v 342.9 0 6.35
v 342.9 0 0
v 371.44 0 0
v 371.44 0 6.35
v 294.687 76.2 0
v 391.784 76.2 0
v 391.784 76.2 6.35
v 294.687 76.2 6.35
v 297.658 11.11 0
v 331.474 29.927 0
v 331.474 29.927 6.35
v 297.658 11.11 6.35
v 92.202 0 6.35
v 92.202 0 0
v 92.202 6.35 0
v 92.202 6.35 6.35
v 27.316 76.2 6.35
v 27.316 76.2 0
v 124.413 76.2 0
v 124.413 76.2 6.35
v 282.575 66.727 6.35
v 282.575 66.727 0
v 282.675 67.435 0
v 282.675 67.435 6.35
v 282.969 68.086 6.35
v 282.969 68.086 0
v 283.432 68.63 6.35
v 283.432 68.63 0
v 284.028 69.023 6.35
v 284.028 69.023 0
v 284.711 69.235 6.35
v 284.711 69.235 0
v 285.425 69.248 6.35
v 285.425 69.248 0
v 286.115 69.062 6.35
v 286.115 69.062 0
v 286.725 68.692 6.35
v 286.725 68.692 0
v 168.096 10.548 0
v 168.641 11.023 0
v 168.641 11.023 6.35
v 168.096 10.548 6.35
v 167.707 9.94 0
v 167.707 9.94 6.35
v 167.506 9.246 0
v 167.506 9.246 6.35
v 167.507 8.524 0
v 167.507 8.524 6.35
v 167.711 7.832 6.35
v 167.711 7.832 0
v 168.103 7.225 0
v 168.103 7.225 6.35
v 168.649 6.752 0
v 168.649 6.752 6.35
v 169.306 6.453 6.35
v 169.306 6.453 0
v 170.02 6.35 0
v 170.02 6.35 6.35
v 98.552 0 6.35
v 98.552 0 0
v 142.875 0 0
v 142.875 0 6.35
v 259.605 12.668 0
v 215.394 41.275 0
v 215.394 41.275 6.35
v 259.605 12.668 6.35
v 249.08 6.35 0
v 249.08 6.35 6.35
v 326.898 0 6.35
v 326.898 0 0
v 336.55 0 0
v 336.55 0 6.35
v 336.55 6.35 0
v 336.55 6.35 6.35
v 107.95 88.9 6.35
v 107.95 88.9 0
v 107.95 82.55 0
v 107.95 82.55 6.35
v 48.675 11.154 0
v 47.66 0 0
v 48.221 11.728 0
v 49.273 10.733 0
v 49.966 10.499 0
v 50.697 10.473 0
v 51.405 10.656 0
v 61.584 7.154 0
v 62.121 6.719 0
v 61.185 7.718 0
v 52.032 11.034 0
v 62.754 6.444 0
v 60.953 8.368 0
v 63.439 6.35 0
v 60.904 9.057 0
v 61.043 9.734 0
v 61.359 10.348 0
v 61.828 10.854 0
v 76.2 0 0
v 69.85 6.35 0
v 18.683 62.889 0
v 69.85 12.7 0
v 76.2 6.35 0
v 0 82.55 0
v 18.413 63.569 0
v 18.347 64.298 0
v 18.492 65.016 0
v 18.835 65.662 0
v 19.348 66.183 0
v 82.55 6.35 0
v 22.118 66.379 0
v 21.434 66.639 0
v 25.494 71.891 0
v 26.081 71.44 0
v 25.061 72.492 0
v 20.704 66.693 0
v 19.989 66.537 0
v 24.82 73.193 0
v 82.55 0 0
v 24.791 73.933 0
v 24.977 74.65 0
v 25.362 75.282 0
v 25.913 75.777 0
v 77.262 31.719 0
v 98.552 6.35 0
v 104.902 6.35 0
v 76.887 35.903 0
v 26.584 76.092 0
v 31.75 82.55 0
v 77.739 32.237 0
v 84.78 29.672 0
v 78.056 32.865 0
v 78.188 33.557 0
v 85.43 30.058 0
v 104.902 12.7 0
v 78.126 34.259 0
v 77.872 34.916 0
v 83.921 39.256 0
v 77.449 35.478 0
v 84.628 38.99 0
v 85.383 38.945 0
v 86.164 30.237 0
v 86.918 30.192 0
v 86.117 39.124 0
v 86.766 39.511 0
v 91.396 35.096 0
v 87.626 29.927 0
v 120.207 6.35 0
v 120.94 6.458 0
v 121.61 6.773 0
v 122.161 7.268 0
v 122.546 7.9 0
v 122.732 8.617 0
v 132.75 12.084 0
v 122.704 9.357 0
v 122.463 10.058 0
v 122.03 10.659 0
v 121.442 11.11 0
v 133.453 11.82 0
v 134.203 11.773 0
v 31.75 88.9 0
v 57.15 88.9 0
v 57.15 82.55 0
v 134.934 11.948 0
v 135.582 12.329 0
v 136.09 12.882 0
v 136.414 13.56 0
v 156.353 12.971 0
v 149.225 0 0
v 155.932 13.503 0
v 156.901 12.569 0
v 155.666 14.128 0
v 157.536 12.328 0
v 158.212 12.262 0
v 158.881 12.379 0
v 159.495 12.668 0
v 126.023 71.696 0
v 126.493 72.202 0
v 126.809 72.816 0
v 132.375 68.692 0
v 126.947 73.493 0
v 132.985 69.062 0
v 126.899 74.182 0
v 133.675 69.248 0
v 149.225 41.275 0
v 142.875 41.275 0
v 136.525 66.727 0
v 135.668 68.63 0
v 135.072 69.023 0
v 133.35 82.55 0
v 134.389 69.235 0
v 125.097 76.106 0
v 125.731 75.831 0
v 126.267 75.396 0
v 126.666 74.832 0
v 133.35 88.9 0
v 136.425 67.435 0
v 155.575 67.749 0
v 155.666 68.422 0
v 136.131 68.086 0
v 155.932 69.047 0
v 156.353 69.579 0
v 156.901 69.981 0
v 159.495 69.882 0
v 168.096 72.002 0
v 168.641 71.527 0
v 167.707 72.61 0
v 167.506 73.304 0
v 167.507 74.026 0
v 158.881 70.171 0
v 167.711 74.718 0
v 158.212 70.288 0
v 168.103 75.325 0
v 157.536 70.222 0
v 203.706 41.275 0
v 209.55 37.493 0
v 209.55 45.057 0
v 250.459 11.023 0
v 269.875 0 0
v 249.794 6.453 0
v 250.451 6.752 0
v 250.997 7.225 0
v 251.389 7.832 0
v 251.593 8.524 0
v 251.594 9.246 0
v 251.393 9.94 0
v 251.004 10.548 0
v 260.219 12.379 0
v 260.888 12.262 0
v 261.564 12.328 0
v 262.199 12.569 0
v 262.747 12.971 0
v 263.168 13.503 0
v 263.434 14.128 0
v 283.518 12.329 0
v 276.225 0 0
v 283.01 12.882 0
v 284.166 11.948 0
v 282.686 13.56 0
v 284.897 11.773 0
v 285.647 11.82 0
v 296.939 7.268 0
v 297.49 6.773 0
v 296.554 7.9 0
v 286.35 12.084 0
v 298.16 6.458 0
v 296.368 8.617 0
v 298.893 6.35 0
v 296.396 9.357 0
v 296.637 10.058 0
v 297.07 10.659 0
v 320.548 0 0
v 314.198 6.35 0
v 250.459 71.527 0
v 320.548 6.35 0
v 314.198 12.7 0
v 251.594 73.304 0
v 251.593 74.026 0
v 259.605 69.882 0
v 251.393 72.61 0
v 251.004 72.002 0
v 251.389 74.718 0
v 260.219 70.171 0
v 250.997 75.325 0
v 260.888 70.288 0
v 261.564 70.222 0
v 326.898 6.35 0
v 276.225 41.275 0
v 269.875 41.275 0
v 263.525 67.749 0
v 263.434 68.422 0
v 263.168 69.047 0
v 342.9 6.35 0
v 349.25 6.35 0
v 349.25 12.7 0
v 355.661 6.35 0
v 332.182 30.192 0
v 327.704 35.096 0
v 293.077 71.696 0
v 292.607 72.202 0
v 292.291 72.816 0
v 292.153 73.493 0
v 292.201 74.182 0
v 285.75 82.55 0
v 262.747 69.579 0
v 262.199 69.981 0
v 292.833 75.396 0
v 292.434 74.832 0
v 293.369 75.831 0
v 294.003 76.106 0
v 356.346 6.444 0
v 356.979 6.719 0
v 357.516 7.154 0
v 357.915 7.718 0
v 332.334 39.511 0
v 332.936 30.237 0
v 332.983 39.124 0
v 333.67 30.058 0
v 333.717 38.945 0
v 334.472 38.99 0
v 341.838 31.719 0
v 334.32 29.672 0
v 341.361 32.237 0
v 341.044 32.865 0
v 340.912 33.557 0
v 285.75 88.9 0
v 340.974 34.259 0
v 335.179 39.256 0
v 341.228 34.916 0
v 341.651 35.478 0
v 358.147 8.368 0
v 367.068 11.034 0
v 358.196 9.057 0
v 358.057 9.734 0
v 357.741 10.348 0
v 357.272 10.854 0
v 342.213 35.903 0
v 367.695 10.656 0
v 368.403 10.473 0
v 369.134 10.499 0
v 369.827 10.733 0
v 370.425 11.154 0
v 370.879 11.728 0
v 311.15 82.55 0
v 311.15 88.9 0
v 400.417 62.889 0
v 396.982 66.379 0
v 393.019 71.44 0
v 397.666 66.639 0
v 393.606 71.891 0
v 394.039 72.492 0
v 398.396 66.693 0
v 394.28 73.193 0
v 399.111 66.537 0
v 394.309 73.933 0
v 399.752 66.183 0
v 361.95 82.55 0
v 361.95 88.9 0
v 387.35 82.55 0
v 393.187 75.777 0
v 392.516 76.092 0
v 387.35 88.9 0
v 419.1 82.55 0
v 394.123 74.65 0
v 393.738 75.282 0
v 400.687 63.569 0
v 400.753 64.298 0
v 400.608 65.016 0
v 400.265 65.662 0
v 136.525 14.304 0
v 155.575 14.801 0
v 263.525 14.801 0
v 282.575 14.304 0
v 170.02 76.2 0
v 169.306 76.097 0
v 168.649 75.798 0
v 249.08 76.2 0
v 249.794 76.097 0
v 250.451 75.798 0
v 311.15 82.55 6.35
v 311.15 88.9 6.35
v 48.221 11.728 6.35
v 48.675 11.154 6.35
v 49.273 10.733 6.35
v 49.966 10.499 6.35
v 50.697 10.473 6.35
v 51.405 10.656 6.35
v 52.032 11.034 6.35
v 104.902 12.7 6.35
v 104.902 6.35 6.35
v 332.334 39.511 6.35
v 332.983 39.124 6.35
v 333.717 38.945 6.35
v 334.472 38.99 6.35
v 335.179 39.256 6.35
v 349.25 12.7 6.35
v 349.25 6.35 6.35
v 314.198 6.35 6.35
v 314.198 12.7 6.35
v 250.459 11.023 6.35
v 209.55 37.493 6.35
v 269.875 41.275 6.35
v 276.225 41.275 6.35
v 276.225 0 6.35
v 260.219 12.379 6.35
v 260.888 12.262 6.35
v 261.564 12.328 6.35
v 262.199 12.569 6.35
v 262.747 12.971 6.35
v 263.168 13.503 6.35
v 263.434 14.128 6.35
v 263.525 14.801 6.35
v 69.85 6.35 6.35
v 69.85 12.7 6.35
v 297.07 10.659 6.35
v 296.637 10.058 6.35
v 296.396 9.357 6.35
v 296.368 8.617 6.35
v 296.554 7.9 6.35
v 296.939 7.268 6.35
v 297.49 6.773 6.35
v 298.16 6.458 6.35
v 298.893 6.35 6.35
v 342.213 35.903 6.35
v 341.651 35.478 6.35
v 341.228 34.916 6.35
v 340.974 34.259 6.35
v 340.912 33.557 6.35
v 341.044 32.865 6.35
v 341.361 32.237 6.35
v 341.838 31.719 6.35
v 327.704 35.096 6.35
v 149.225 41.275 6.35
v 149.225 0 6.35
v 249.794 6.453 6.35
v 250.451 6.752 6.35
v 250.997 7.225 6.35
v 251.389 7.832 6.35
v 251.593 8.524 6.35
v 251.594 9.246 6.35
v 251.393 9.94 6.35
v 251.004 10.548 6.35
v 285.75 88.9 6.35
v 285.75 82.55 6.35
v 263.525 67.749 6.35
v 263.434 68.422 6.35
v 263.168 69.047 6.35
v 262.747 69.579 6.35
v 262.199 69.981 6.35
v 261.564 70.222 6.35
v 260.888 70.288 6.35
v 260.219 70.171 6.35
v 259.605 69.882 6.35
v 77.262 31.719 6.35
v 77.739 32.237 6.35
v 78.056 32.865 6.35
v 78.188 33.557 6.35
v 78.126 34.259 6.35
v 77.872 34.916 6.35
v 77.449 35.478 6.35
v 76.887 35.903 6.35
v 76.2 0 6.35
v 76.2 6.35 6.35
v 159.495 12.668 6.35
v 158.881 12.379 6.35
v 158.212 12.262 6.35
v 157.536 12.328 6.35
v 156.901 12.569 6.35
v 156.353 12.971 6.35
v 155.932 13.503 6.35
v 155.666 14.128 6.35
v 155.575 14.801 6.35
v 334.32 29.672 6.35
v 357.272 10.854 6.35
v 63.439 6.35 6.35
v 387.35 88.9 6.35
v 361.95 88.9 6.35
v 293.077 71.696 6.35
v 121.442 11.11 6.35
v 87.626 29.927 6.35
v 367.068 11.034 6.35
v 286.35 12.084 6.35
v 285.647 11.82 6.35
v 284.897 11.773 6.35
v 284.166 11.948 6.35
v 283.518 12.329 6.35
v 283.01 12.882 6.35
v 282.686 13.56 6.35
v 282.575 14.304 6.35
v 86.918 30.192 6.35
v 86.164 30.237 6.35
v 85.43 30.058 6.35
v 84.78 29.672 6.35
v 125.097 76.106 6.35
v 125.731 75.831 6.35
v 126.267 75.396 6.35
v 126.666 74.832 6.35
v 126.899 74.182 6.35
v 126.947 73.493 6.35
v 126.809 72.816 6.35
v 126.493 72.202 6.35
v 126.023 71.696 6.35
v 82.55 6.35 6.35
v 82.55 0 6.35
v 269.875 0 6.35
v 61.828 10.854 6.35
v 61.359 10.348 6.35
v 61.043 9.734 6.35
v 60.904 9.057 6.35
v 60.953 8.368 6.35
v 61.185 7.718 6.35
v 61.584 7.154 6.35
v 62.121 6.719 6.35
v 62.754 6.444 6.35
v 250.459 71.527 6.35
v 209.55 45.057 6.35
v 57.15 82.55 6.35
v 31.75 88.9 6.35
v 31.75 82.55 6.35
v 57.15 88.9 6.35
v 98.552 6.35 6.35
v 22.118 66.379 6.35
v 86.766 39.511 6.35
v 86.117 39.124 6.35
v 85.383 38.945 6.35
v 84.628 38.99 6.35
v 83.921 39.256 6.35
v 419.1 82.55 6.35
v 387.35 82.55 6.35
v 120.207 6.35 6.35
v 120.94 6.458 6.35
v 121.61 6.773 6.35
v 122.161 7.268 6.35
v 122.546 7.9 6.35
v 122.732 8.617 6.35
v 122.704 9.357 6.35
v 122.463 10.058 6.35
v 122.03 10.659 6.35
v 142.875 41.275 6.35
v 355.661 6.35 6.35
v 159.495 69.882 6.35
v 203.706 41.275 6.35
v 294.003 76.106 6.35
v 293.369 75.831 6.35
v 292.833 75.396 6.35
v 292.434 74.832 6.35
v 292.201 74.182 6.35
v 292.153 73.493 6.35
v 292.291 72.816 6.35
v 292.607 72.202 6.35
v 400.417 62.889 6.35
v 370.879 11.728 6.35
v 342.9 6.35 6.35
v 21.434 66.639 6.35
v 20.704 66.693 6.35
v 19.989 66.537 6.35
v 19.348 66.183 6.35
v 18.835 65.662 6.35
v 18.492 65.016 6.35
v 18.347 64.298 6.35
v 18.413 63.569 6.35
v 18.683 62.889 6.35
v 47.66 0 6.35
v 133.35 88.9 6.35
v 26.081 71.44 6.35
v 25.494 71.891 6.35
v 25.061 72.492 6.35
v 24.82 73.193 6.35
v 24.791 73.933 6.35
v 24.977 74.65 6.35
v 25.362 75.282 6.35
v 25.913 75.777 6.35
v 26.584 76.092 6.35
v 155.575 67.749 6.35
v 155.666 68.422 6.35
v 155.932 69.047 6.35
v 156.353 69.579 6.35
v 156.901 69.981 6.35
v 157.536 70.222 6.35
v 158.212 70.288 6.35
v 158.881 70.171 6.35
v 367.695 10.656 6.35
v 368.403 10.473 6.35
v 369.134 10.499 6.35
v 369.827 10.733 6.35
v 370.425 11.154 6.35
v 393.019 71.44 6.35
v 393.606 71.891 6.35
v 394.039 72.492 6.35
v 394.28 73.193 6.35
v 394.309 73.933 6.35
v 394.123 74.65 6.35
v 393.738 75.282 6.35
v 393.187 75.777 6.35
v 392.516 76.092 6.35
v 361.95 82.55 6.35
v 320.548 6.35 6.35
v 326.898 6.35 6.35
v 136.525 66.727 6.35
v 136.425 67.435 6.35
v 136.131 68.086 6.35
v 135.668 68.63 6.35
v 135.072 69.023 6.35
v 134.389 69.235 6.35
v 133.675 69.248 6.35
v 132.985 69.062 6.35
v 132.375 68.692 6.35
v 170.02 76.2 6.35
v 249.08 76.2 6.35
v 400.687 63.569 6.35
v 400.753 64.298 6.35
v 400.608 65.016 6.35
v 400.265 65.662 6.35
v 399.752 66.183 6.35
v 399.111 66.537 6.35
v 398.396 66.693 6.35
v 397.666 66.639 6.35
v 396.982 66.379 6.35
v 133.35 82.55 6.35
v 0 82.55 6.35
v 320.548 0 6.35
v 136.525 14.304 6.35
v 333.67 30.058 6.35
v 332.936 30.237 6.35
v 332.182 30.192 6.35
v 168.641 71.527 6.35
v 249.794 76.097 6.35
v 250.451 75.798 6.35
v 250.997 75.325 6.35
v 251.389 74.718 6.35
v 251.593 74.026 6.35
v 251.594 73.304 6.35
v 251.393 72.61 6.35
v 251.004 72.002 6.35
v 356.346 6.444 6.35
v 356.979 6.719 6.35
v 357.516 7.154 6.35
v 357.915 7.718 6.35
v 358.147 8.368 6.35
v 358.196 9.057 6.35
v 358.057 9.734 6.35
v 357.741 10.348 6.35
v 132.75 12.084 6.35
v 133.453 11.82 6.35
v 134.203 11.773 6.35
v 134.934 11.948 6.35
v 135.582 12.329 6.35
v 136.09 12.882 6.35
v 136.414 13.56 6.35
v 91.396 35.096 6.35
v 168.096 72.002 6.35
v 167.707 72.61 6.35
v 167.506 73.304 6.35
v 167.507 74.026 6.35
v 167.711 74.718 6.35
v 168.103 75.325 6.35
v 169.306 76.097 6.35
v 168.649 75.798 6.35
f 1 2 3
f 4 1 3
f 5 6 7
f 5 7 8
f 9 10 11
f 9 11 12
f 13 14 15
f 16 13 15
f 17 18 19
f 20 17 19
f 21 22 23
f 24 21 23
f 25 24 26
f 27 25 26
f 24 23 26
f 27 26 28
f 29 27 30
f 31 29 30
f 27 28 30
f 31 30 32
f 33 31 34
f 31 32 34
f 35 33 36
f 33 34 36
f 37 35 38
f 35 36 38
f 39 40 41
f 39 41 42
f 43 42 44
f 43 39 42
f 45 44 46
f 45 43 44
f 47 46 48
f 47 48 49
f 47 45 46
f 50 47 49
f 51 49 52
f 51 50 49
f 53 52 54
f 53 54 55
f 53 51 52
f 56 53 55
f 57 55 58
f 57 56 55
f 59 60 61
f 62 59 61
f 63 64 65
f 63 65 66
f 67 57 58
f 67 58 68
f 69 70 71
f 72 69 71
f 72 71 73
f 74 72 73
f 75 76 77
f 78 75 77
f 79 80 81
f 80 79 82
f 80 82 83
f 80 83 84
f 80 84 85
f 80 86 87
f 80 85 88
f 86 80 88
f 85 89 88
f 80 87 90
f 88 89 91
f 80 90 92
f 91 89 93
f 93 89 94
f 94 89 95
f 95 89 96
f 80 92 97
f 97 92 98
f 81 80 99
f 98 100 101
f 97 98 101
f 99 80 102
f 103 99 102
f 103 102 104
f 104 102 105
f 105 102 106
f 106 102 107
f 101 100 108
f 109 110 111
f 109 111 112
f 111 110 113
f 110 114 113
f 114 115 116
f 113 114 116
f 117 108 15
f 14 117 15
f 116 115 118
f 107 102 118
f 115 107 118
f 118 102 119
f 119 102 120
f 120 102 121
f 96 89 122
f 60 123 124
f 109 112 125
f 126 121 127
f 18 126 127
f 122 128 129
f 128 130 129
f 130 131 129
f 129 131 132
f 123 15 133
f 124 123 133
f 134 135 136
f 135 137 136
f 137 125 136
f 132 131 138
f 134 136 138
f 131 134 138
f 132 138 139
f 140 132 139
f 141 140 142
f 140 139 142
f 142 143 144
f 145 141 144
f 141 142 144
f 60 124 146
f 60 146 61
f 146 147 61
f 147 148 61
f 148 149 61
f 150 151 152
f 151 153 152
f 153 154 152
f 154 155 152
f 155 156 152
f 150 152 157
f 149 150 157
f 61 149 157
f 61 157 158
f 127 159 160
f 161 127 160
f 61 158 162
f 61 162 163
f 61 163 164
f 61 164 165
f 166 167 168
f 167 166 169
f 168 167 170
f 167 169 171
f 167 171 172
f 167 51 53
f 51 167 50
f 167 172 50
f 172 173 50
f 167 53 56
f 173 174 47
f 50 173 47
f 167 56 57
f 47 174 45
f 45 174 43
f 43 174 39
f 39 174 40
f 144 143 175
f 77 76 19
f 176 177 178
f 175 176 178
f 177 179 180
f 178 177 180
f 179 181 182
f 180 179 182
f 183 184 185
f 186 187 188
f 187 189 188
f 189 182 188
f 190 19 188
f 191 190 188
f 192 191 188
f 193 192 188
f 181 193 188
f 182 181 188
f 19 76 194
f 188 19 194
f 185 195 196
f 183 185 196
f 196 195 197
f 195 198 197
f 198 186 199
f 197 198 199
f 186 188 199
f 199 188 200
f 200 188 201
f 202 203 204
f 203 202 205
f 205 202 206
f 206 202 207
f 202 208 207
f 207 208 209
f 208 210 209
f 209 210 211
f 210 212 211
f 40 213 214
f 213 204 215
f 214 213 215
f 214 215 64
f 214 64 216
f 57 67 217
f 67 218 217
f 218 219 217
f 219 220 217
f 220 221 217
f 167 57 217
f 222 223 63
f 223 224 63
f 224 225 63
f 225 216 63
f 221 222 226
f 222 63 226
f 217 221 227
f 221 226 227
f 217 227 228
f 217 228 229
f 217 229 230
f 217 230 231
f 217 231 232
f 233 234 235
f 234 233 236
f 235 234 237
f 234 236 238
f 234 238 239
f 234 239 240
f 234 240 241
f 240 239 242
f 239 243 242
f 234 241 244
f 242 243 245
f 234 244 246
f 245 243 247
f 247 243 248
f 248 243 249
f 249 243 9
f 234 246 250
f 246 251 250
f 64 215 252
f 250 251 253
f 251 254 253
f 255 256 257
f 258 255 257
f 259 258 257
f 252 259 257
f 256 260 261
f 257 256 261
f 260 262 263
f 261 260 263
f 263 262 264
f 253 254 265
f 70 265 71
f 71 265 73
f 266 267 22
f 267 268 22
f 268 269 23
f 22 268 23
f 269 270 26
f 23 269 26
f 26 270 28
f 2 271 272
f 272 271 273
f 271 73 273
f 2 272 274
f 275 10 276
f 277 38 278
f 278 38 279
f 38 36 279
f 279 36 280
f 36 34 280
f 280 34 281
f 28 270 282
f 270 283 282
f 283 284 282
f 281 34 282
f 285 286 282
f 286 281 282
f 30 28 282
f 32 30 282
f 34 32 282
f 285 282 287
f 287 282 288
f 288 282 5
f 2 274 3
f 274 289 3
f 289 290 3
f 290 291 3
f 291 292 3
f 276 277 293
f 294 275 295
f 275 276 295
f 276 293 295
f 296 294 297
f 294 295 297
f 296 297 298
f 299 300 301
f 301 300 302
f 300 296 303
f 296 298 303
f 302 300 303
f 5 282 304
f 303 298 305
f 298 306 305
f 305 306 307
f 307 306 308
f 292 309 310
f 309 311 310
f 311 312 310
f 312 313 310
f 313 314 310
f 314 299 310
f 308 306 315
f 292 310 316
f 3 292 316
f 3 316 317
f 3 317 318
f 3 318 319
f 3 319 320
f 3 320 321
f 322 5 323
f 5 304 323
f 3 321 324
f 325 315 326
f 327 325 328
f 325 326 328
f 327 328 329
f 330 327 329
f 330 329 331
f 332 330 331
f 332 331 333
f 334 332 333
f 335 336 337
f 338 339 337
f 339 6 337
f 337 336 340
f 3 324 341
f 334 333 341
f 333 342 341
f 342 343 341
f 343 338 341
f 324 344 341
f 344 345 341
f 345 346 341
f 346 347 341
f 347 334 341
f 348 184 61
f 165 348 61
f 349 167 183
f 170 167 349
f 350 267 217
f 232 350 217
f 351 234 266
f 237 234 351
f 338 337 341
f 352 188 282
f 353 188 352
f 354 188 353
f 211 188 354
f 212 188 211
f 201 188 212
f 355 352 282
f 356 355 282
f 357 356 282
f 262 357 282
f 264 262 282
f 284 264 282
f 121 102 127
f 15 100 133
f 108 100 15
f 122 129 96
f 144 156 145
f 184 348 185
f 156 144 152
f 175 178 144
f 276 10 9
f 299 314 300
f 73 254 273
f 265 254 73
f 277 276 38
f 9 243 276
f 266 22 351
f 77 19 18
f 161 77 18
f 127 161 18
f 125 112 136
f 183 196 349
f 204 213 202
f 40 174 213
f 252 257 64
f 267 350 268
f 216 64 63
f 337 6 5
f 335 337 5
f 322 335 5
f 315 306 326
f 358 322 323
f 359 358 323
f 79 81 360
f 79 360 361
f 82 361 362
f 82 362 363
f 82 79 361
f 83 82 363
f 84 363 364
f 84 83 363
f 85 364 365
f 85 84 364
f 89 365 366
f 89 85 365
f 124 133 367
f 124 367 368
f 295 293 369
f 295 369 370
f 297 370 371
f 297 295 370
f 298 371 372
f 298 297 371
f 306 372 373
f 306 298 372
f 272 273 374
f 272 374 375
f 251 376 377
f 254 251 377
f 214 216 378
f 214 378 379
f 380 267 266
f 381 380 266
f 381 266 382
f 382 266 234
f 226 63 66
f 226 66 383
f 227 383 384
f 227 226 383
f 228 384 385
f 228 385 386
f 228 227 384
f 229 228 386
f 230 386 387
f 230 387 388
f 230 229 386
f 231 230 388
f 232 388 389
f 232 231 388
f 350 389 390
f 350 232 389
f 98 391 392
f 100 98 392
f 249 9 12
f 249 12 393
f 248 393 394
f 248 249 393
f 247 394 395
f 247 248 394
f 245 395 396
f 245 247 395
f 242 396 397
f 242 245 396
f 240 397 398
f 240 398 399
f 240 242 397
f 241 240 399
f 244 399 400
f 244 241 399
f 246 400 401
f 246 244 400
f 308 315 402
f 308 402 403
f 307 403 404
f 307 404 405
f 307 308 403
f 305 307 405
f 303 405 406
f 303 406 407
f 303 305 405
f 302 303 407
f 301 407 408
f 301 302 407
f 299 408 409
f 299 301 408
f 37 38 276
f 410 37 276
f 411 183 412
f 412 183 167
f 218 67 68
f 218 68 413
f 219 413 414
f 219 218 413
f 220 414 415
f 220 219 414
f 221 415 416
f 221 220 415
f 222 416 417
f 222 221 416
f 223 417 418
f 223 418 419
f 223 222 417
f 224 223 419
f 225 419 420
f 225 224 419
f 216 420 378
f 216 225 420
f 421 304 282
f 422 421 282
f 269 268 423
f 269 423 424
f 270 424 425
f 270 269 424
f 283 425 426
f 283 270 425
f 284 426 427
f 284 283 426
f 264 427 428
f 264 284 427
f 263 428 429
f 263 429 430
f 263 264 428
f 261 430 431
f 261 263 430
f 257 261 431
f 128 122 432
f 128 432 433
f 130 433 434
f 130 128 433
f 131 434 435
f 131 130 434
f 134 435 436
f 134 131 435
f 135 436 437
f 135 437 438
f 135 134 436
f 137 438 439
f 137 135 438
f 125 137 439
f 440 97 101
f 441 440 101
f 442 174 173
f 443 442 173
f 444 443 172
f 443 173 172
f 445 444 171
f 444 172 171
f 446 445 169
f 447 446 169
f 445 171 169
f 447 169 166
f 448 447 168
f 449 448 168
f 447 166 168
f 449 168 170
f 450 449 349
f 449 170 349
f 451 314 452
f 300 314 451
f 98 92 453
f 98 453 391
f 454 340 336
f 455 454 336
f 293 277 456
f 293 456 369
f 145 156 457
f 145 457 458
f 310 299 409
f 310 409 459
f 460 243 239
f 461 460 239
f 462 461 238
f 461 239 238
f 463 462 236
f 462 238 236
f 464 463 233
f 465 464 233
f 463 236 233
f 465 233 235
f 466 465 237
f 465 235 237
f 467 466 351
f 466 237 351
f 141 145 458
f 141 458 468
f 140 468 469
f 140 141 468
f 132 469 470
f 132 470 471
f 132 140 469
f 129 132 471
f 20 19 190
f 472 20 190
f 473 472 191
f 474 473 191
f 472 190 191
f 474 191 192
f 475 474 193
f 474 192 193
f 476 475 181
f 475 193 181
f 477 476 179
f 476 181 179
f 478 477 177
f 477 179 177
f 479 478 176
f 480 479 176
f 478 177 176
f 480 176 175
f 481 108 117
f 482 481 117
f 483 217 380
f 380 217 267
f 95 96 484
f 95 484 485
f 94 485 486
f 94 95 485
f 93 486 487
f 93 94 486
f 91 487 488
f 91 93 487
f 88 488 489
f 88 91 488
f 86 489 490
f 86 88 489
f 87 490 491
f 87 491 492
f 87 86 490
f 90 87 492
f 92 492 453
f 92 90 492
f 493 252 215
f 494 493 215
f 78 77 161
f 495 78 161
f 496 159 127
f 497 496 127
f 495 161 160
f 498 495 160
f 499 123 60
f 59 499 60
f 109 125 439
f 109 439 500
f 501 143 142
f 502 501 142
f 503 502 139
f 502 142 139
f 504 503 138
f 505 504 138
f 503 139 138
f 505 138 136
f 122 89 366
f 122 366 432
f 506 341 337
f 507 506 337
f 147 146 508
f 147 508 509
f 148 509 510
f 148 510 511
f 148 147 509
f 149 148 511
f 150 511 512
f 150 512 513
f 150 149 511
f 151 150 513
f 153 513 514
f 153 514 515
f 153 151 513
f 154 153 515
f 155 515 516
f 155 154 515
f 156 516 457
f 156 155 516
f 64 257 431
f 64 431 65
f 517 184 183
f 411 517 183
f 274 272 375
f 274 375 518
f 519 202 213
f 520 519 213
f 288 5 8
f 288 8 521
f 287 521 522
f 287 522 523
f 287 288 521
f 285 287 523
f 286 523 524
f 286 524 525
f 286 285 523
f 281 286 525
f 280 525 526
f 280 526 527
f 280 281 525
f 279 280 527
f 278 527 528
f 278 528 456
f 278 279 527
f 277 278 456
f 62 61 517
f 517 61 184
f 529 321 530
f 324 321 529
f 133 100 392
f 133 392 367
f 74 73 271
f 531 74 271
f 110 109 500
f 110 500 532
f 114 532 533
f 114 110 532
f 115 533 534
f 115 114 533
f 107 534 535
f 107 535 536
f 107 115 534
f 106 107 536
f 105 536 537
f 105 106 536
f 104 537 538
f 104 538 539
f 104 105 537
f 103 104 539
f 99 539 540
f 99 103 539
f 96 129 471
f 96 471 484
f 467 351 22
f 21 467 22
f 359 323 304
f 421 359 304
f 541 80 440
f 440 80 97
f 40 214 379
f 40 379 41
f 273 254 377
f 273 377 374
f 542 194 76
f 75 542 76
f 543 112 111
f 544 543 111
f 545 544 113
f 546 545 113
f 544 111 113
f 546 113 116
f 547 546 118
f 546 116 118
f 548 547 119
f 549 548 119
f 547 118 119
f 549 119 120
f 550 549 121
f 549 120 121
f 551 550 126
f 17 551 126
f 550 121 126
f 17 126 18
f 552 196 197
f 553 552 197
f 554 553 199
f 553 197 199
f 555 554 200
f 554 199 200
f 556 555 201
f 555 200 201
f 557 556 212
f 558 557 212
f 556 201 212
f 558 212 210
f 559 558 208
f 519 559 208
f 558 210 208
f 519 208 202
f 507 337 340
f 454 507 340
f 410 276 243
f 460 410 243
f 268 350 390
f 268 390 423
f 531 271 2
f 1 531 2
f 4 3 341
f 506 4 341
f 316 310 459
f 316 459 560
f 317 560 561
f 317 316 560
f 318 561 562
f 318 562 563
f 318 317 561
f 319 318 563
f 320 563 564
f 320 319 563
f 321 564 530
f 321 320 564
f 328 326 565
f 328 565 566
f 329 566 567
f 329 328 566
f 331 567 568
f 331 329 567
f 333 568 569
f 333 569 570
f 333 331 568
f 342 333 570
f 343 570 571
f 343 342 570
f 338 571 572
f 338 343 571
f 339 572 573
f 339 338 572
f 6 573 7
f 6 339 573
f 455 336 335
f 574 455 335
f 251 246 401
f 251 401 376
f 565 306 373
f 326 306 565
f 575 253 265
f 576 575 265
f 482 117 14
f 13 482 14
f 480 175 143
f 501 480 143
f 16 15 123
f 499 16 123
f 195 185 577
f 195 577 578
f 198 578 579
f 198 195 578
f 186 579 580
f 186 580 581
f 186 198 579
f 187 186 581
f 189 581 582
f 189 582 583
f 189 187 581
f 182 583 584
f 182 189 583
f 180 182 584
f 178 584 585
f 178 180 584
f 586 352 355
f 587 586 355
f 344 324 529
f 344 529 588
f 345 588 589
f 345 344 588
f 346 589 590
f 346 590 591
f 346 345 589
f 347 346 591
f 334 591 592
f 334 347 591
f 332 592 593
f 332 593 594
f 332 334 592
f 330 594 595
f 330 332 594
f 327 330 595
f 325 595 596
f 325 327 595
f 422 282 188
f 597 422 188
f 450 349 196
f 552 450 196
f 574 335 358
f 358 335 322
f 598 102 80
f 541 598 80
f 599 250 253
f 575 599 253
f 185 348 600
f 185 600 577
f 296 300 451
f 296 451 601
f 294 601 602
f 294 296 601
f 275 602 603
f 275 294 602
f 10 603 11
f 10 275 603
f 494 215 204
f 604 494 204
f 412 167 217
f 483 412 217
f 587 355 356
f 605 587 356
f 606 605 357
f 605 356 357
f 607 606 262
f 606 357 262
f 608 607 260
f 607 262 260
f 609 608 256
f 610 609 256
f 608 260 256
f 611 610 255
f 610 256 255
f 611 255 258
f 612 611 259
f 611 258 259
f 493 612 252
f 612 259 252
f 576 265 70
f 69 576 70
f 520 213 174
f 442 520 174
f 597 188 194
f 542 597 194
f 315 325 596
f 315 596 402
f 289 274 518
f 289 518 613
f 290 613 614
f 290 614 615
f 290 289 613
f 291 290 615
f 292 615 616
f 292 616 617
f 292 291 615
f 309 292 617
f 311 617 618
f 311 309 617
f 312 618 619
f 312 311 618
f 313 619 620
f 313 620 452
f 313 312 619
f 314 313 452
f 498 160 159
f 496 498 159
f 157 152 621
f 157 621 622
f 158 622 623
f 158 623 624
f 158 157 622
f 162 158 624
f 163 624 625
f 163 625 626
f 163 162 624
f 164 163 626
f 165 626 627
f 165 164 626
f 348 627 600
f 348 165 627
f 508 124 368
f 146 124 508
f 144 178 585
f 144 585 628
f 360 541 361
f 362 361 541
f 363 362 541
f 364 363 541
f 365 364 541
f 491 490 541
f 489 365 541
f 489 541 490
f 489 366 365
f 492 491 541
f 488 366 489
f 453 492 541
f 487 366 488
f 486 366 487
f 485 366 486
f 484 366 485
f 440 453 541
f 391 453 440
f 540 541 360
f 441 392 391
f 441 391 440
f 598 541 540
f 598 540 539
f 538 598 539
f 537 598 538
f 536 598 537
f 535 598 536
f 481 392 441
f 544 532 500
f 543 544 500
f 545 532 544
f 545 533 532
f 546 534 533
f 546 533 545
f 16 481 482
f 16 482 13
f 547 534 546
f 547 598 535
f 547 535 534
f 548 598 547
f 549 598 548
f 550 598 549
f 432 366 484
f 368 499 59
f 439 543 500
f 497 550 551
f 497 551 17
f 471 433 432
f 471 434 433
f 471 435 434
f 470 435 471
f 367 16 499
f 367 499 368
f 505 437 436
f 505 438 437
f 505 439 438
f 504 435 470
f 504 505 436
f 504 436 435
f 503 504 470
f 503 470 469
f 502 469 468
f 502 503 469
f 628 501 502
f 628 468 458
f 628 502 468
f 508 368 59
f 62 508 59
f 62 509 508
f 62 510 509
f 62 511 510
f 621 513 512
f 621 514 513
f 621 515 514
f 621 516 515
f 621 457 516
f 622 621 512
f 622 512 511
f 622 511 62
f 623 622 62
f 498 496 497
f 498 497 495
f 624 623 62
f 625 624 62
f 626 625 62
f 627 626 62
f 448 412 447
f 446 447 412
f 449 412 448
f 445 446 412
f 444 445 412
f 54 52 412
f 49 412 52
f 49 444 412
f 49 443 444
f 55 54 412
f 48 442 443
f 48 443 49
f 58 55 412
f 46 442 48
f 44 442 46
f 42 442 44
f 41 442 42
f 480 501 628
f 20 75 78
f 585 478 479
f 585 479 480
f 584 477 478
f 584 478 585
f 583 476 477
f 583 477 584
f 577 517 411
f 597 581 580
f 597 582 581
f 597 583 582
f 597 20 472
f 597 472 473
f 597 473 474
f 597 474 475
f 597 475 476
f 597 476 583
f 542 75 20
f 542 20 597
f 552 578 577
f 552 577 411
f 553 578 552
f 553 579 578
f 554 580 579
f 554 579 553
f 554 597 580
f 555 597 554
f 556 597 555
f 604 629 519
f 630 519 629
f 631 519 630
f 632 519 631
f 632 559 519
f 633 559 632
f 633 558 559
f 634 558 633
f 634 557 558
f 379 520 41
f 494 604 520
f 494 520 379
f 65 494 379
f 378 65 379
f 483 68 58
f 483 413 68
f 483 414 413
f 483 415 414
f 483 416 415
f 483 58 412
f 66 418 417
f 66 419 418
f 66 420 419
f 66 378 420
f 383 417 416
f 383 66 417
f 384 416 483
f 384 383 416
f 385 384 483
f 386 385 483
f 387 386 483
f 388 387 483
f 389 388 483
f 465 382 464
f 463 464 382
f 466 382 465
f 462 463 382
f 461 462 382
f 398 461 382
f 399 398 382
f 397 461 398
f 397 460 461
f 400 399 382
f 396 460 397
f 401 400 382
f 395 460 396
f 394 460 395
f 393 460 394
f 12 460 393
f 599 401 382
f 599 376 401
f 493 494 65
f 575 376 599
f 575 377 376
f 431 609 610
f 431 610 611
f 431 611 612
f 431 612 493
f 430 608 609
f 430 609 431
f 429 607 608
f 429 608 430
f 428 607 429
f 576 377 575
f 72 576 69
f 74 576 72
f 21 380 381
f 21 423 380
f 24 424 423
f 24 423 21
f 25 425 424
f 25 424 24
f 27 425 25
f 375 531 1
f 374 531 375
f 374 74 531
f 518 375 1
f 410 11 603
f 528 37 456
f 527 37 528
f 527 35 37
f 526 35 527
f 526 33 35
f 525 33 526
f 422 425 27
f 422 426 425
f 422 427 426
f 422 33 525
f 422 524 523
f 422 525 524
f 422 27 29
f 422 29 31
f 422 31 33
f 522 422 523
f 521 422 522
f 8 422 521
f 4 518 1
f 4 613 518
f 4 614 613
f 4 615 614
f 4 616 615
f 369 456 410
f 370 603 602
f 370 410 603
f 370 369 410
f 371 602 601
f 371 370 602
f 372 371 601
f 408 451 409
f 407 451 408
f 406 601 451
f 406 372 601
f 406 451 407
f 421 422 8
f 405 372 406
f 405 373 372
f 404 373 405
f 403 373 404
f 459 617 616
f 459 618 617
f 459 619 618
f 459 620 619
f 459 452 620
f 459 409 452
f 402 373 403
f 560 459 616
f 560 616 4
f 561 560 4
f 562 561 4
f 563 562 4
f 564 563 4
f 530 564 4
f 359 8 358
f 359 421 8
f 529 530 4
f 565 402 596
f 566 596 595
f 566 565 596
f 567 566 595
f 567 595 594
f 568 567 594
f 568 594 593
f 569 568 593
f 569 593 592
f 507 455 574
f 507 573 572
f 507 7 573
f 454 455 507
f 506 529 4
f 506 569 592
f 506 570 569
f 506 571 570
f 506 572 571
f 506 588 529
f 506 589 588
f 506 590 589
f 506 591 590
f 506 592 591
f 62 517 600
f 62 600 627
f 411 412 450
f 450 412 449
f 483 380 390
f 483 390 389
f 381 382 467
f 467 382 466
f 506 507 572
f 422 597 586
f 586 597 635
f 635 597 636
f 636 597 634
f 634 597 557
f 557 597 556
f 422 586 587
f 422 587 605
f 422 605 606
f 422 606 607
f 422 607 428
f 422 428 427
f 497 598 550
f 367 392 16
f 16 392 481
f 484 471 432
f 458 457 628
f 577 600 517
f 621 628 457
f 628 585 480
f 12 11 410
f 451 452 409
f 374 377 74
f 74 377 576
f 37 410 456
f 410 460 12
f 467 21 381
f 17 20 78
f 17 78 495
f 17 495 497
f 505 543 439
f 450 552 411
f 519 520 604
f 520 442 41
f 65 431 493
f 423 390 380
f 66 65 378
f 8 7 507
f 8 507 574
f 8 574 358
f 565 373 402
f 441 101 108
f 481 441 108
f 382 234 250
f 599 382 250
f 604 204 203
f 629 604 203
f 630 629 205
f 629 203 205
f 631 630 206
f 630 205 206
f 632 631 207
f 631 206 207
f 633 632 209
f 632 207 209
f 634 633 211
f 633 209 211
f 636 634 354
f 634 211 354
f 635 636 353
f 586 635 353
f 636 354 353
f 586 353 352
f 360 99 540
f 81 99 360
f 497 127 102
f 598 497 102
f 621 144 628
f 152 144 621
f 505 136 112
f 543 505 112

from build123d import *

# Parameters (mm, degrees)
EXTRUDE2_DEPTH = 6.35


with BuildPart() as part:
    # Sketch1 → Extrude2 (new body)
    with BuildSketch(Plane.XY):
        Polygon((47.660264722, 0), (76.2, 0), (76.2, 6.35), (82.55, 6.35), (82.55, 0), (92.202, 0), (92.202, 6.35), (98.552, 6.35), (98.552, 0), (142.875, 0), (142.875, 41.275), (149.225, 41.275), (149.225, 0), (209.55, 0), (269.875, 0), (269.875, 41.275), (276.225, 41.275), (276.225, 0), (320.548, 0), (320.548, 6.35), (326.898, 6.35), (326.898, 0), (336.55, 0), (336.55, 6.35), (342.9, 6.35), (342.9, 0), (371.439735278, 0), (419.1, 82.55), (387.35, 82.55), (387.35, 88.9), (361.95, 88.9), (361.95, 82.55), (311.15, 82.55), (311.15, 88.9), (285.75, 88.9), (285.75, 82.55), (209.55, 82.55), (133.35, 82.55), (133.35, 88.9), (107.95, 88.9), (107.95, 82.55), (57.15, 82.55), (57.15, 88.9), (31.75, 88.9), (31.75, 82.55), (0, 82.55), align=None)
        with BuildLine():
            Line((170.020448202, 6.35), (249.079551798, 6.35))
            ThreePointArc((249.079551798, 6.35), (251.515549625, 8.170615133), (250.459410045, 11.022508199))
            Line((250.459410045, 11.022508199), (209.55, 37.493302934))
            Line((209.55, 37.493302934), (168.640589955, 11.022508199))
            ThreePointArc((168.640589955, 11.022508199), (167.584450375, 8.170615133), (170.020448202, 6.35))
        make_face(mode=Mode.SUBTRACT)
        with BuildLine():
            Line((155.575, 14.800584131), (155.575, 67.749415869))
            ThreePointArc((155.575, 67.749415869), (156.901171335, 69.98060837), (159.494858247, 69.881924069))
            Line((159.494858247, 69.881924069), (203.70555908, 41.275))
            Line((203.70555908, 41.275), (159.494858247, 12.668075931))
            ThreePointArc((159.494858247, 12.668075931), (156.901171335, 12.56939163), (155.575, 14.800584131))
        make_face(mode=Mode.SUBTRACT)
        with BuildLine():
            Line((170.020448202, 76.2), (249.079551798, 76.2))
            ThreePointArc((249.079551798, 76.2), (251.515549625, 74.379384867), (250.459410045, 71.527491801))
            Line((250.459410045, 71.527491801), (209.55, 45.056697066))
            Line((209.55, 45.056697066), (168.640589955, 71.527491801))
            ThreePointArc((168.640589955, 71.527491801), (167.584450375, 74.379384867), (170.020448202, 76.2))
        make_face(mode=Mode.SUBTRACT)
        with BuildLine():
            Line((136.525, 14.303625696), (136.525, 66.727414853))
            ThreePointArc((136.525, 66.727414853), (135.071559028, 69.023278411), (132.374614584, 68.691659953))
            Line((132.374614584, 68.691659953), (91.396300636, 35.095608642))
            Line((91.396300636, 35.095608642), (132.749939536, 12.084115469))
            ThreePointArc((132.749939536, 12.084115469), (135.272351238, 12.114030576), (136.525, 14.303625696))
        make_face(mode=Mode.SUBTRACT)
        with BuildLine():
            Line((104.902, 6.35), (120.207049127, 6.35))
            ThreePointArc((120.207049127, 6.35), (122.665621474, 8.252017233), (121.442109591, 11.109510228))
            Line((121.442109591, 11.109510228), (87.625811497, 29.926802573))
            ThreePointArc((87.625811497, 29.926802573), (86.163798888, 30.2371328), (84.780365617, 29.671537445))
            Line((84.780365617, 29.671537445), (61.828236325, 10.8542451))
            ThreePointArc((61.828236325, 10.8542451), (61.046887793, 8.034892566), (63.438621741, 6.35))
            Line((63.438621741, 6.35), (69.85, 6.35))
            Line((69.85, 6.35), (69.85, 12.7))
            Line((69.85, 12.7), (104.902, 12.7))
            Line((104.902, 12.7), (104.902, 6.35))
        make_face(mode=Mode.SUBTRACT)
        with BuildLine():
            Line((18.683371551, 62.889451217), (48.221461062, 11.727979426))
            ThreePointArc((48.221461062, 11.727979426), (49.965843374, 10.499123351), (52.031551003, 11.033734326))
            Line((52.031551003, 11.033734326), (77.262001053, 31.718906867))
            ThreePointArc((77.262001053, 31.718906867), (78.181456091, 33.910104112), (76.886676101, 35.902662194))
            Line((76.886676101, 35.902662194), (22.118136541, 66.378961445))
            ThreePointArc((22.118136541, 66.378961445), (19.07288135, 65.941246674), (18.683371551, 62.889451217))
        make_face(mode=Mode.SUBTRACT)
        with BuildLine():
            Line((27.316473501, 76.2), (124.41281719, 76.2))
            ThreePointArc((124.41281719, 76.2), (126.804551138, 74.515107434), (126.023202606, 71.6957549))
            Line((126.023202606, 71.6957549), (86.766032084, 39.510782213))
            ThreePointArc((86.766032084, 39.510782213), (85.382598814, 38.945186859), (83.920586204, 39.255517086))
            Line((83.920586204, 39.255517086), (26.081413037, 71.440489772))
            ThreePointArc((26.081413037, 71.440489772), (24.857901154, 74.297982767), (27.316473501, 76.2))
        make_face(mode=Mode.SUBTRACT)
        with BuildLine():
            Line((331.474188503, 29.926802573), (297.657890409, 11.109510228))
            ThreePointArc((297.657890409, 11.109510228), (296.434378526, 8.252017233), (298.892950873, 6.35))
            Line((298.892950873, 6.35), (314.198, 6.35))
            Line((314.198, 6.35), (314.198, 12.7))
            Line((314.198, 12.7), (349.25, 12.7))
            Line((349.25, 12.7), (349.25, 6.35))
            Line((349.25, 6.35), (355.661378259, 6.35))
            ThreePointArc((355.661378259, 6.35), (358.053112207, 8.034892566), (357.271763675, 10.8542451))
            Line((357.271763675, 10.8542451), (334.319634383, 29.671537445))
            ThreePointArc((334.319634383, 29.671537445), (332.936201112, 30.2371328), (331.474188503, 29.926802573))
        make_face(mode=Mode.SUBTRACT)
        with BuildLine():
            Line((327.703699364, 35.095608642), (286.350060464, 12.084115469))
            ThreePointArc((286.350060464, 12.084115469), (283.827648762, 12.114030576), (282.575, 14.303625696))
            Line((282.575, 14.303625696), (282.575, 66.727414853))
            ThreePointArc((282.575, 66.727414853), (284.028440972, 69.023278411), (286.725385416, 68.691659953))
            Line((286.725385416, 68.691659953), (327.703699364, 35.095608642))
        make_face(mode=Mode.SUBTRACT)
        with BuildLine():
            Line((341.837998947, 31.718906867), (367.068448997, 11.033734326))
            ThreePointArc((367.068448997, 11.033734326), (369.134156626, 10.499123351), (370.878538938, 11.727979426))
            Line((370.878538938, 11.727979426), (400.416628449, 62.889451217))
            ThreePointArc((400.416628449, 62.889451217), (400.02711865, 65.941246674), (396.981863459, 66.378961445))
            Line((396.981863459, 66.378961445), (342.213323899, 35.902662194))
            ThreePointArc((342.213323899, 35.902662194), (340.918543909, 33.910104112), (341.837998947, 31.718906867))
        make_face(mode=Mode.SUBTRACT)
        with BuildLine():
            Line((259.605141753, 69.881924069), (215.39444092, 41.275))
            Line((215.39444092, 41.275), (259.605141753, 12.668075931))
            ThreePointArc((259.605141753, 12.668075931), (262.198828665, 12.56939163), (263.525, 14.800584131))
            Line((263.525, 14.800584131), (263.525, 67.749415869))
            ThreePointArc((263.525, 67.749415869), (262.198828665, 69.98060837), (259.605141753, 69.881924069))
        make_face(mode=Mode.SUBTRACT)
        with BuildLine():
            Line((293.076797394, 71.6957549), (332.333967916, 39.510782213))
            ThreePointArc((332.333967916, 39.510782213), (333.717401186, 38.945186859), (335.179413796, 39.255517086))
            Line((335.179413796, 39.255517086), (393.018586963, 71.440489772))
            ThreePointArc((393.018586963, 71.440489772), (394.242098846, 74.297982767), (391.783526499, 76.2))
            Line((391.783526499, 76.2), (294.68718281, 76.2))
            ThreePointArc((294.68718281, 76.2), (292.295448862, 74.515107434), (293.076797394, 71.6957549))
        make_face(mode=Mode.SUBTRACT)
    extrude(amount=EXTRUDE2_DEPTH)


solid = part.part
